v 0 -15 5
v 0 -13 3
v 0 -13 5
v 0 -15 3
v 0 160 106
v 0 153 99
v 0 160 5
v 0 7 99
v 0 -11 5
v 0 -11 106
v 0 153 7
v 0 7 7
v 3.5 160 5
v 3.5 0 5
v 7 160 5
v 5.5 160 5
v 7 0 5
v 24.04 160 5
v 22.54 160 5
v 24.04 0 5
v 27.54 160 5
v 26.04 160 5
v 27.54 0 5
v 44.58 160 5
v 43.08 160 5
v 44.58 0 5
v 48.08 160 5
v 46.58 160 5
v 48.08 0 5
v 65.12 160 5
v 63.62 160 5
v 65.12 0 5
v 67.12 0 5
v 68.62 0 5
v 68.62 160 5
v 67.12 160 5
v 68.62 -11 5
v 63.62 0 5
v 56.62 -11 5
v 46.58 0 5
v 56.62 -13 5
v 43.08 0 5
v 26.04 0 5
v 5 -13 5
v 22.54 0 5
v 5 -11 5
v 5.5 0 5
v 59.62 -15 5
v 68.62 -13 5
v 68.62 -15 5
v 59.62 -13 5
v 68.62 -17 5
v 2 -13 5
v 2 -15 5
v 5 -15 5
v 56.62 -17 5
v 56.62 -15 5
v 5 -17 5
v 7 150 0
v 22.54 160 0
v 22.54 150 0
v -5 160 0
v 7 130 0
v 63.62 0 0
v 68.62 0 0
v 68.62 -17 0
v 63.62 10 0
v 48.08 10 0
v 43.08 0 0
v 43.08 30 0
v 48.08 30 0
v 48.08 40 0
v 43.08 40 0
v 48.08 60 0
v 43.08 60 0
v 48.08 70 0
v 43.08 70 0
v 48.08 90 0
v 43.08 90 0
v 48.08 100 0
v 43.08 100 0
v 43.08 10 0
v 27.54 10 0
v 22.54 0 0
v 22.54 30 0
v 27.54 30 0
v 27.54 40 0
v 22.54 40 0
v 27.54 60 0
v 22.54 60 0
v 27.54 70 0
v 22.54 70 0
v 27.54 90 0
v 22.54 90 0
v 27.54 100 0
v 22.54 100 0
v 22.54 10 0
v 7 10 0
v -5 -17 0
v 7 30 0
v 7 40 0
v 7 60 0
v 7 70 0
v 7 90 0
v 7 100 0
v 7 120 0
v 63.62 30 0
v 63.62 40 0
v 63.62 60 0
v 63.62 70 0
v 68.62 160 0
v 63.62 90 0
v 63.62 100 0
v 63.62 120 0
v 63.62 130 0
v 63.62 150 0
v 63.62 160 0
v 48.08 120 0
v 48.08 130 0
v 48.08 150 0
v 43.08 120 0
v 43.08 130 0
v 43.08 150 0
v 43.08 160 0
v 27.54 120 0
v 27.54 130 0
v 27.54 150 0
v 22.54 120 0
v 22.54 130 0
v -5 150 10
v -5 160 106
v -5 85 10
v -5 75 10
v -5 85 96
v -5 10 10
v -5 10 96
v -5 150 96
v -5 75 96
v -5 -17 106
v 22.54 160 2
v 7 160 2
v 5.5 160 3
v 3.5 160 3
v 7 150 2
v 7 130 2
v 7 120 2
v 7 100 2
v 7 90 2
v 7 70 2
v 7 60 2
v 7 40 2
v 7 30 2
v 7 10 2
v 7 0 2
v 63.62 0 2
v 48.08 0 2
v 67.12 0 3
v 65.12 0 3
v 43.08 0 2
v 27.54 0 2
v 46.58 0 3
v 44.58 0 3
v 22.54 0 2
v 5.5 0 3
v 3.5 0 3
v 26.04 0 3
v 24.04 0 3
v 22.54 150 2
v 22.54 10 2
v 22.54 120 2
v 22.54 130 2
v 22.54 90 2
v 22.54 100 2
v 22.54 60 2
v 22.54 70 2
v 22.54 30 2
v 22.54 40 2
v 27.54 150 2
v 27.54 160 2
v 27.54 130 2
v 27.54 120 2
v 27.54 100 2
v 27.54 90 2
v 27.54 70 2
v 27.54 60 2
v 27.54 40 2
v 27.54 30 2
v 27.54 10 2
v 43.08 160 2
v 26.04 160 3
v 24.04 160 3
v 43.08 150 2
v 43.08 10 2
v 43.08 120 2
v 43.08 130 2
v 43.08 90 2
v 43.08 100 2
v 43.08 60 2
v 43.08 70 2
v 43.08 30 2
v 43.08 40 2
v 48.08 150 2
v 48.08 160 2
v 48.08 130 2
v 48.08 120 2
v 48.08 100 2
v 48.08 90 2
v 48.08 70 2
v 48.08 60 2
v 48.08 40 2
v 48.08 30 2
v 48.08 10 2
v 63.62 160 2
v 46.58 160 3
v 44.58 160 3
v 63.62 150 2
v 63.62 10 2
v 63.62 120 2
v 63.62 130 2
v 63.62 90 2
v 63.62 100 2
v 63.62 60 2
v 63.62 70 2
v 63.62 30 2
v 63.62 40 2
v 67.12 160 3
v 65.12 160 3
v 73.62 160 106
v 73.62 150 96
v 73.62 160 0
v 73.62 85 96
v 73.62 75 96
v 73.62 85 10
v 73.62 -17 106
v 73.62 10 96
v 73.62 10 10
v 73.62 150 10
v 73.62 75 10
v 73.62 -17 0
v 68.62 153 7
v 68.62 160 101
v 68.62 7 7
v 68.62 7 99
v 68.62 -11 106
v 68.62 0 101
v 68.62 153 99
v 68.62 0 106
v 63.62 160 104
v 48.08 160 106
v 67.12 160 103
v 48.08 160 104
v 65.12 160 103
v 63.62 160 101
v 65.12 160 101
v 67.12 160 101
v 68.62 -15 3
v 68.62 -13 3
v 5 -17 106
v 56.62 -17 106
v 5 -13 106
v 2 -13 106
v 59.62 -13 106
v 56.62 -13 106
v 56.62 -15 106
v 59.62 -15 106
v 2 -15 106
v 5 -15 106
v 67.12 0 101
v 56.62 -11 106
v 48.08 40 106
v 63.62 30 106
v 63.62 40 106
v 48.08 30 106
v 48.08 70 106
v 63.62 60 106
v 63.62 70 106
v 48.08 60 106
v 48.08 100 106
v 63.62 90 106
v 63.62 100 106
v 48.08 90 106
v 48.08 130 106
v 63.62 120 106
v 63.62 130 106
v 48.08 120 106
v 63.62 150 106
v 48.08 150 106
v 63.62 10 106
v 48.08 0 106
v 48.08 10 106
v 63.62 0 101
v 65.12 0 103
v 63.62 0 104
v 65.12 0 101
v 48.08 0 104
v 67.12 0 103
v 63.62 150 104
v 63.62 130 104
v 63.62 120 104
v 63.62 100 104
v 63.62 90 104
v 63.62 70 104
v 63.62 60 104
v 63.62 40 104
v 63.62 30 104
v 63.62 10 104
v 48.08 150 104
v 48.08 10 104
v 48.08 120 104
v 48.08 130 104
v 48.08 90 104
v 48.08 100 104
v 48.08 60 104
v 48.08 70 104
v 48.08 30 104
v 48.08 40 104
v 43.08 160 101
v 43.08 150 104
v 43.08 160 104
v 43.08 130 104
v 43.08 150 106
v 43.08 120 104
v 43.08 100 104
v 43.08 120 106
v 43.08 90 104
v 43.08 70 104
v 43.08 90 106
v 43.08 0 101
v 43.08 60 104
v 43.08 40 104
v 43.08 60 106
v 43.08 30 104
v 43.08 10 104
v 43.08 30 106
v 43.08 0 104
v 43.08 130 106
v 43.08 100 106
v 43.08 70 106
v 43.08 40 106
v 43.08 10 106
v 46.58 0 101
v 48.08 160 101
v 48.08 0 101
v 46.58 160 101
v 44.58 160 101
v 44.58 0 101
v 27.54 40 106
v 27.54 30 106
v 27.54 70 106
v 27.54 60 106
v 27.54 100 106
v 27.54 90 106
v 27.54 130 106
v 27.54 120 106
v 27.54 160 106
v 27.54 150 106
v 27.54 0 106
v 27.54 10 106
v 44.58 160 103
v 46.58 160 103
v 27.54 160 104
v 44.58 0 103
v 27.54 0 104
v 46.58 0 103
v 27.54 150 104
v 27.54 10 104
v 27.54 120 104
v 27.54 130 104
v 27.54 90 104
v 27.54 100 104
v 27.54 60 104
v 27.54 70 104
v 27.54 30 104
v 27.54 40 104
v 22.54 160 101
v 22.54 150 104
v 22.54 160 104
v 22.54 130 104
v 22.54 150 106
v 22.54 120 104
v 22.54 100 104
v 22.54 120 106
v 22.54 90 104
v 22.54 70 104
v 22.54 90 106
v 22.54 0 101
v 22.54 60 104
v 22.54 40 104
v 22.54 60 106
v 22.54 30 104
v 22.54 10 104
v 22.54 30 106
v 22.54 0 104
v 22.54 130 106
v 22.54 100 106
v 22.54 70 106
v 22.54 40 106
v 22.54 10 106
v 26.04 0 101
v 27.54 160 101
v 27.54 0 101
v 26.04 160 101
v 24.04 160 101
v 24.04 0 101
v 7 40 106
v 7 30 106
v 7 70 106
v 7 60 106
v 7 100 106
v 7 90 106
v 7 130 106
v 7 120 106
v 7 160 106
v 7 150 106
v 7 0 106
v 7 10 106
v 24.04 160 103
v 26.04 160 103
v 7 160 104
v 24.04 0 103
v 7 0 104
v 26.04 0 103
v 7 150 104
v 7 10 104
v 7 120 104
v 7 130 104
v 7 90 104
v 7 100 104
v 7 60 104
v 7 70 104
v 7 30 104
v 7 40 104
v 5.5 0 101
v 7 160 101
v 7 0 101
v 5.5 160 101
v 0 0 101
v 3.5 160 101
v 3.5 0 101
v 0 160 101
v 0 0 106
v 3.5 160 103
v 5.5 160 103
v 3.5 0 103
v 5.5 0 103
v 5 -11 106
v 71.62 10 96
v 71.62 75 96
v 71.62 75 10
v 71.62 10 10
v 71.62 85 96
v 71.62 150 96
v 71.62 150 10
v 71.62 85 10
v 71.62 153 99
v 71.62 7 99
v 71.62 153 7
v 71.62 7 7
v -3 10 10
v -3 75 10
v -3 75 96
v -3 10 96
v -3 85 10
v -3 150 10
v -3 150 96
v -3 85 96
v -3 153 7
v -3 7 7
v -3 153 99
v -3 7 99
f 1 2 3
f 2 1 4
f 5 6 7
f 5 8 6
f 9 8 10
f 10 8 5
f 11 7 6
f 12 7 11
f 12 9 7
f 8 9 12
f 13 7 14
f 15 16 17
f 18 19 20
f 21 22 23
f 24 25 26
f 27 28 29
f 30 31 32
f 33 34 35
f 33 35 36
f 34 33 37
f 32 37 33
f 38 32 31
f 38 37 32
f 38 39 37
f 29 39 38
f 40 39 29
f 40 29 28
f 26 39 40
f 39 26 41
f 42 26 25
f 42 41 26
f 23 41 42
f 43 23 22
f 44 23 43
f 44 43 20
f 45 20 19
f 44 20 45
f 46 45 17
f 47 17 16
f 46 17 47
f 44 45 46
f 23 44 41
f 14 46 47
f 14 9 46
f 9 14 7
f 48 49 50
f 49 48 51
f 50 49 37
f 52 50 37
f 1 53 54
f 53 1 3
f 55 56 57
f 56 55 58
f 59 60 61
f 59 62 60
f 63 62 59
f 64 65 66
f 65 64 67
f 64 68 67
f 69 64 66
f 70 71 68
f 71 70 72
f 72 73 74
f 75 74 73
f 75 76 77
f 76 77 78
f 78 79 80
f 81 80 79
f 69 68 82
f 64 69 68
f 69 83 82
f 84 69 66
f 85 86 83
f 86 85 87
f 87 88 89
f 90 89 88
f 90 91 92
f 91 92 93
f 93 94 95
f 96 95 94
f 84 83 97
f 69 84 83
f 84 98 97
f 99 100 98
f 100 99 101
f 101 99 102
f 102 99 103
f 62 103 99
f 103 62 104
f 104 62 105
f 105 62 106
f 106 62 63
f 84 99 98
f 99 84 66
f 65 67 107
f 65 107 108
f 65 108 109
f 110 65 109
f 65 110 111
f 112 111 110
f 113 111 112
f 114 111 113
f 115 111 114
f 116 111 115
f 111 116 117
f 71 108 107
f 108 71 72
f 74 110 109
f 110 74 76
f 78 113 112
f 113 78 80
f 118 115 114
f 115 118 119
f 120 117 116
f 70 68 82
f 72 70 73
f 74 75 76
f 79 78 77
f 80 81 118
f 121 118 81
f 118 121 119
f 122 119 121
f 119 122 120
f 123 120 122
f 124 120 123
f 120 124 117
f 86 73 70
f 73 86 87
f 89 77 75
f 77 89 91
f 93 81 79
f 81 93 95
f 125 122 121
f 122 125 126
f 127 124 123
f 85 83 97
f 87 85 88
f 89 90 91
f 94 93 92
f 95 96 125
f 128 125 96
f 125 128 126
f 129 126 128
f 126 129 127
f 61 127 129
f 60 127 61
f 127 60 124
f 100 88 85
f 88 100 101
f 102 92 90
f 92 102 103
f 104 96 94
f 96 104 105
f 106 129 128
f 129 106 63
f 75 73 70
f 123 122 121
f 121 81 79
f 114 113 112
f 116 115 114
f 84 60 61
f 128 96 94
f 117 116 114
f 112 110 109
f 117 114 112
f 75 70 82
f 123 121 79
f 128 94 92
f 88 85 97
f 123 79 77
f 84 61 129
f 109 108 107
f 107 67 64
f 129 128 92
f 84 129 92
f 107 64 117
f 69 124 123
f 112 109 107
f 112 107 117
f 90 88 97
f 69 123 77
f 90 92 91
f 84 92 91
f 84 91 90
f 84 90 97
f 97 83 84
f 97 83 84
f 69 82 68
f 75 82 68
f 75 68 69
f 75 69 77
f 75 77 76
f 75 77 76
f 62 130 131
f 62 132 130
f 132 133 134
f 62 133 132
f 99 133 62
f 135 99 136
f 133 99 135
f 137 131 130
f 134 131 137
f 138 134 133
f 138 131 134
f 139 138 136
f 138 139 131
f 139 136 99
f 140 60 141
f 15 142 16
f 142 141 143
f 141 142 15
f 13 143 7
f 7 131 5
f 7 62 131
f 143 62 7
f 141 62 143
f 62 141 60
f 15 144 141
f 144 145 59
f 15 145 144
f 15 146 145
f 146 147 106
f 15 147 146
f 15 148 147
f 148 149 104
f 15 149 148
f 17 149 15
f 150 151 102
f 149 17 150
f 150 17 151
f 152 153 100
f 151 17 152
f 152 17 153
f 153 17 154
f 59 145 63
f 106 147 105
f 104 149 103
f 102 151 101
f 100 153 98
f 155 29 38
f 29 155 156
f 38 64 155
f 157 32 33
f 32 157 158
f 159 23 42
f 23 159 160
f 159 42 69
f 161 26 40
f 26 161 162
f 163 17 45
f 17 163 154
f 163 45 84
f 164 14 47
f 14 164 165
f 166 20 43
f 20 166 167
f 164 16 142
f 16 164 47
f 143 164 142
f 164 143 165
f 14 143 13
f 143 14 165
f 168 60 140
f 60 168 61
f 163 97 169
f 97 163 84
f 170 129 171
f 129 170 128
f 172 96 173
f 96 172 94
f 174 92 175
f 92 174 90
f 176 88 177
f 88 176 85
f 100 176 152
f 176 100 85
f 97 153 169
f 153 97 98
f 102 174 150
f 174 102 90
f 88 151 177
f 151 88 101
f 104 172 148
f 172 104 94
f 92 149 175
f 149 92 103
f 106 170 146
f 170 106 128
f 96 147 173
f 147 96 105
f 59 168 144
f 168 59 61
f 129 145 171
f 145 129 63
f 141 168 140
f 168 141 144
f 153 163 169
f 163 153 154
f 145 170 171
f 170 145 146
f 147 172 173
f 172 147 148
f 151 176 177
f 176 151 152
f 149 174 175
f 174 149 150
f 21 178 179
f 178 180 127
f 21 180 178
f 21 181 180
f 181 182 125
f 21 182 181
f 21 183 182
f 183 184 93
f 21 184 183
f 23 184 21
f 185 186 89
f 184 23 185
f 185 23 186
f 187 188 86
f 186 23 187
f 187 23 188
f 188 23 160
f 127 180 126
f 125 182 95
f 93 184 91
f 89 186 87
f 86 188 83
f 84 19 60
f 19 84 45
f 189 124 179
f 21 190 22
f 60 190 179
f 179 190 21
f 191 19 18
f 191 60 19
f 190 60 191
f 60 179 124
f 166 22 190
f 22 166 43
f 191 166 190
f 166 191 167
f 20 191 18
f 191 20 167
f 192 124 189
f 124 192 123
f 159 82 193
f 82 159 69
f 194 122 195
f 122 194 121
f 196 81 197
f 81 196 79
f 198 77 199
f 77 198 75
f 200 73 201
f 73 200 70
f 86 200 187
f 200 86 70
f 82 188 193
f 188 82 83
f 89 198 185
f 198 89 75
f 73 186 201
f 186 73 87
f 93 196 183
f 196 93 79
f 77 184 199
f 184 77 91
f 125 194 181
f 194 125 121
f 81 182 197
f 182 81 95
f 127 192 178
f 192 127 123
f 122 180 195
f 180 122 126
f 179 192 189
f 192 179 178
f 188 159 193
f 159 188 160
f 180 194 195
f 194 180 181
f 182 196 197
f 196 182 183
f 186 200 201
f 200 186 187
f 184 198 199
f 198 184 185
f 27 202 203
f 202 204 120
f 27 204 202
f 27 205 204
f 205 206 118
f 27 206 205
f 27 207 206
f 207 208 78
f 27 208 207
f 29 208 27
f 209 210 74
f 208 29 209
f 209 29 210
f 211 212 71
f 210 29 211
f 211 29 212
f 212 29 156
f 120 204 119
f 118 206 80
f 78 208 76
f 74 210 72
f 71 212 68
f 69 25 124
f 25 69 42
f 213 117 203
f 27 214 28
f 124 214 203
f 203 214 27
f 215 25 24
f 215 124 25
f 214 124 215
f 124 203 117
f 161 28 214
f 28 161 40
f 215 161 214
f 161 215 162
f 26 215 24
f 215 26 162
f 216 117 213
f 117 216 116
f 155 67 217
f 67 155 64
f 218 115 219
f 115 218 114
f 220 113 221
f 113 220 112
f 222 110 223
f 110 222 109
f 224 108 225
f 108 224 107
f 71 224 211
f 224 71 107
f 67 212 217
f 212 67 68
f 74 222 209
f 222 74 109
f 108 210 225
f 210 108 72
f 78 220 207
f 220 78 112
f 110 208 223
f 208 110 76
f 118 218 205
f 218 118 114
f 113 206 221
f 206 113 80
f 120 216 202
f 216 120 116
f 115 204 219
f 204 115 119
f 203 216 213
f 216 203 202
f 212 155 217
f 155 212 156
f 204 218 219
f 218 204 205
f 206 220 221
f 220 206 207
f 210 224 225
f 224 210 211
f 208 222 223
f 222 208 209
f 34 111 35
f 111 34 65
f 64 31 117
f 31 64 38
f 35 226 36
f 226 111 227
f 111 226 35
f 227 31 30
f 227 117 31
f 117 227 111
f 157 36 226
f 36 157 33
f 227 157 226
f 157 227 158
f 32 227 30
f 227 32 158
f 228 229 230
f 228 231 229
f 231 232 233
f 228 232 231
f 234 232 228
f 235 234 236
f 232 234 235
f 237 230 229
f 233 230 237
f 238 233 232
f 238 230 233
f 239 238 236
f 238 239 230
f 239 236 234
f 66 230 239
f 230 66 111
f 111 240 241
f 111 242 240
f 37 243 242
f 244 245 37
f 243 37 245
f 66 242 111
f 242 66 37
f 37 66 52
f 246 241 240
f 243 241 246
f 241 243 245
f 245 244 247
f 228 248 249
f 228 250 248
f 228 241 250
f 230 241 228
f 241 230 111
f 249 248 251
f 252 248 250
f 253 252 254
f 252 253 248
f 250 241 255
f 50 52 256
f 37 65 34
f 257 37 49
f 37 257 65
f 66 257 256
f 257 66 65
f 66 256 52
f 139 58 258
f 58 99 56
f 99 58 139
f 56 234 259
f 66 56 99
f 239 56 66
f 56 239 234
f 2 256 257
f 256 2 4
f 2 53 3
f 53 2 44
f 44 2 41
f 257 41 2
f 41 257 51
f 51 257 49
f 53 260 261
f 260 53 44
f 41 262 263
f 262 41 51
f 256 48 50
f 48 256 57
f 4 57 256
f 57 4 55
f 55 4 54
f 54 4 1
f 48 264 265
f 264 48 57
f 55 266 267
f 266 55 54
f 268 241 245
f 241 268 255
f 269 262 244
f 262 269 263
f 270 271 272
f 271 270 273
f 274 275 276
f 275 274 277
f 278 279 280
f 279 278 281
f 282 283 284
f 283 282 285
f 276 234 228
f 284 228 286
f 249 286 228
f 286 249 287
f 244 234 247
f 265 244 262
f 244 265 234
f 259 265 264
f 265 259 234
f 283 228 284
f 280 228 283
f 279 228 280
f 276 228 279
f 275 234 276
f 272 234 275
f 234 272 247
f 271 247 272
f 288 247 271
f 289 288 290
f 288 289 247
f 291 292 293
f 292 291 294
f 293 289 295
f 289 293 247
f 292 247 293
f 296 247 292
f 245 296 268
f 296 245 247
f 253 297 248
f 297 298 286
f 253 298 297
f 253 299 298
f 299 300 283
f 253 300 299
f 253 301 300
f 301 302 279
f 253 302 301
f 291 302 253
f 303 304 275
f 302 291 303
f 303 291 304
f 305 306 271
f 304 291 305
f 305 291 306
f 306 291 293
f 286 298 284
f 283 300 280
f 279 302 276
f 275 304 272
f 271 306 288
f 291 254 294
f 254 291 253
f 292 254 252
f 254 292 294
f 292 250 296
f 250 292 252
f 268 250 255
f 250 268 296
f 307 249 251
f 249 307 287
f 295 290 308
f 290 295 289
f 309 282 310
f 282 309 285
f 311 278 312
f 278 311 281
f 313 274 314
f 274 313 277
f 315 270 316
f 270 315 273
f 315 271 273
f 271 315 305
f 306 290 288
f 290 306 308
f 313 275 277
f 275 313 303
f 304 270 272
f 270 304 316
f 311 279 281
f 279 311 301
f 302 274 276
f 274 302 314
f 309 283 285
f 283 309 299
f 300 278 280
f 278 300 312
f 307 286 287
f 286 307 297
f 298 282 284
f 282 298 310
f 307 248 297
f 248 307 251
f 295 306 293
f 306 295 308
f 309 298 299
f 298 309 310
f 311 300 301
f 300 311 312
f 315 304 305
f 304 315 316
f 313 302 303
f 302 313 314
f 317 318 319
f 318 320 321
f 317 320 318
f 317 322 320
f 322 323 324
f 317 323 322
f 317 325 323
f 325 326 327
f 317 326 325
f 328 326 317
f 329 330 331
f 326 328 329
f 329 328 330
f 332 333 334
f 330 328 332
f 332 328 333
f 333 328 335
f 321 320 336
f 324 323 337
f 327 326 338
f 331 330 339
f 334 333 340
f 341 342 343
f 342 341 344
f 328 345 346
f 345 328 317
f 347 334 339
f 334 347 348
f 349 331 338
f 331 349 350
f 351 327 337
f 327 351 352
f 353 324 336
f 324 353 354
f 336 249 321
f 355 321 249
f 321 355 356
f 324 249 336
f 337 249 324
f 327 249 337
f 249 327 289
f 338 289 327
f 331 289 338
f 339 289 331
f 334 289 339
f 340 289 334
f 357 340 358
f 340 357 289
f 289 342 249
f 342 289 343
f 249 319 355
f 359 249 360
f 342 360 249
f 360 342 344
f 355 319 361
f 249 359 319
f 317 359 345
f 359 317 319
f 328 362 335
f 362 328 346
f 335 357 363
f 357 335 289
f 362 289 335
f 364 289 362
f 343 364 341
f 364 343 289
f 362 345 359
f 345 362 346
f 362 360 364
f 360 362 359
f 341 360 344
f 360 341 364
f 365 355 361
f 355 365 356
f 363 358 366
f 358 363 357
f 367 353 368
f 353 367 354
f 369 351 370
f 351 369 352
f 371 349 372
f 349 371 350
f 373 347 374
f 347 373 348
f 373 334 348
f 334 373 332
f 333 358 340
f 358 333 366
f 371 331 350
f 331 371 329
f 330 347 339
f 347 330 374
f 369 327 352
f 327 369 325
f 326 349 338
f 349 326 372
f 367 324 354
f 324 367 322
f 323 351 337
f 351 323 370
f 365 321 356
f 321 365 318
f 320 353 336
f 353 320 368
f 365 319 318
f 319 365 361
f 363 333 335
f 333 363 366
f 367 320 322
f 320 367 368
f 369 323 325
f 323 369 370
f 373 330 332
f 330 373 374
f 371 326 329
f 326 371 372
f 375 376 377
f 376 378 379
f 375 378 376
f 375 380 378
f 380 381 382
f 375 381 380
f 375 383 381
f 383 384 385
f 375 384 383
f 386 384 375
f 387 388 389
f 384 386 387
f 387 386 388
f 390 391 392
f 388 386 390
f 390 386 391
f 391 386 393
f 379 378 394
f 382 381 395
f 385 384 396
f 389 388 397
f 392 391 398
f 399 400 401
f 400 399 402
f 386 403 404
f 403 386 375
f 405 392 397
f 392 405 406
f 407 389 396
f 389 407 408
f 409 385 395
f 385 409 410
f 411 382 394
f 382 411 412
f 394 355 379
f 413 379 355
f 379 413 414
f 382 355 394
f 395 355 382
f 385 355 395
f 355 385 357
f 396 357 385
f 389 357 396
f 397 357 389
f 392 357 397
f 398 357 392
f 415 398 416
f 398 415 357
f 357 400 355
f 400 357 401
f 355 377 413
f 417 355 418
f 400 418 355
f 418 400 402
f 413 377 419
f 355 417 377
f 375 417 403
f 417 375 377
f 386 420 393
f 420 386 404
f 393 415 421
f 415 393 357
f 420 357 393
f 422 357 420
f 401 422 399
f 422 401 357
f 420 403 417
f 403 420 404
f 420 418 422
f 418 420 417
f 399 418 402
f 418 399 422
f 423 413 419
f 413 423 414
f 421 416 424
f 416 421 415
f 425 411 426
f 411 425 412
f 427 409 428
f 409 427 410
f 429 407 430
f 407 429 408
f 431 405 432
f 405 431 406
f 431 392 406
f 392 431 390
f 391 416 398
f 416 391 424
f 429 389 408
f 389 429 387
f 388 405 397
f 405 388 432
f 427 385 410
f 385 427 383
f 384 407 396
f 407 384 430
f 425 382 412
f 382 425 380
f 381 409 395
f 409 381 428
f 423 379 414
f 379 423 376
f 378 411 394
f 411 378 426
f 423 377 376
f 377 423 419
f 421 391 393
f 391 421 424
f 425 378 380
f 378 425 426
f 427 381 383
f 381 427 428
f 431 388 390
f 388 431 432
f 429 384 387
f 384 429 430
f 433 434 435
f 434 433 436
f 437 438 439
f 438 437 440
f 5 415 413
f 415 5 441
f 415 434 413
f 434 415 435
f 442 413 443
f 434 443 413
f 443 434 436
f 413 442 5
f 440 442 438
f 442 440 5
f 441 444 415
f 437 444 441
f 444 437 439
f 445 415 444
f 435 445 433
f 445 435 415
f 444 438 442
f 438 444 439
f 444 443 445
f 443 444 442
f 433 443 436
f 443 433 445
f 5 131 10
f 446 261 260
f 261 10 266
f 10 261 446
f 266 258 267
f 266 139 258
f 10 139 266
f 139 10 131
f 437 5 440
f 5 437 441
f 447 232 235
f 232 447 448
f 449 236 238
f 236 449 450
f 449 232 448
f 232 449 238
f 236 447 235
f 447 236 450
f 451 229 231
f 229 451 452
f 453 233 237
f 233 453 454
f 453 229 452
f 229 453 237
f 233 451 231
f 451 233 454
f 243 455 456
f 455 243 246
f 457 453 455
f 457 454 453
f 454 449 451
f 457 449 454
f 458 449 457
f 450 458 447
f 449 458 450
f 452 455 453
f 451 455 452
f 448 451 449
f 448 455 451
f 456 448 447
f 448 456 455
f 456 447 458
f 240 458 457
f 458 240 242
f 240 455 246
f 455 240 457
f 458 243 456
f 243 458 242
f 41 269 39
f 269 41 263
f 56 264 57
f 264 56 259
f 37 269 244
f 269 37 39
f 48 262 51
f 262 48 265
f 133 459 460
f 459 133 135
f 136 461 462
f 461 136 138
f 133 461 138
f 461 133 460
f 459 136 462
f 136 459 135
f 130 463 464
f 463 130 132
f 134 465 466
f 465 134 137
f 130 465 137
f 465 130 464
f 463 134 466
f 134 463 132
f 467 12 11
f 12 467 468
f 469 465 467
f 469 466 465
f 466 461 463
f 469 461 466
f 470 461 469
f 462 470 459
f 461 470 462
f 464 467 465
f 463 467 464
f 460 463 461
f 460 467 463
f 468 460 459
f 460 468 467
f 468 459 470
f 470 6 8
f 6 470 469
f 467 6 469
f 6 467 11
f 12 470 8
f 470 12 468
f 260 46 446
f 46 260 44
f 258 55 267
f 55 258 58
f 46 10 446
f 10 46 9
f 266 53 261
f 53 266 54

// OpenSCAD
/*
 * $Id: ecb3-cage.scad 2023 2022-11-01 18:48:36 curt
 * card cage for the retrobrew ecb 3 slot motherboard.
 * the motherboard is held on 3 sides by the cage, and the
 * last side is open to allow somewhat permissive placement of
 * the molex power connector and power switch.  
 * the molex can't really be placed vertically, since it would interfere with the
 * card slide of the bottom card.  
 * placing the molex power connector at a right angle is fine, 
 * the back of motherboard is fine also, after rotating the connector of course.
 *
 * CAUTION: this is my first openscad program, so there may be truly horrific
 * stylistic faux pas in here that a more seasoned openscad programmer would never
 * do.  this is not a showcase of awesome openscad chops, which I do not have.
 */
 
 /*
  * this strange hack is used to express the above designs as individual
  * layers, possibly rotated into the assembled unit.
  * if the string contains 'a', then display everything in assembled orientation
  * if the string contains any of 'lrtb', 
  * display the corresponding left, right, top, bottom side
  * this facility is what I use to test fit the cage together.
  * there may be a better way to do this, but I haven't seen it yet.  
  * as soon as I do, I'll grab it.  
  * there's way too many magic numbers in the translations.
  * this would be possibly made cleaner using some form of a 'min' or 'max'
  * of an object
  */
express = "lrtba";

 /*
  * none of the variables in this file are really tunable
  * they're here to make the code a bit more readable
  * and to create the possiblity of making a future version of this source
  * code work for some other card cage
  */
pitch = 20.54;                  // space between slots
railwidth = 5;                  // size of rail body
gapwidth = pitch - railwidth;   // the space between rails

rails = 3;
railheight = 5;

conlength = 17;
edge = (railwidth + gapwidth) * rails + railwidth + 2;

/*
 * a card guide with a groove on a rail
 */
 module rail(width, height, length, groovewidth, grooveheight) { 
    difference() {
        cube([width, length, height]);
        translate([(width - groovewidth) / 2, -1, height - grooveheight]) 
            cube([groovewidth, length+2, grooveheight + 1]);
    }
}

/*
 * the rails for the 160mm cards
 * there's an extra rail that won't be used for card, but for a cover.
 * this has a little too much slop in the card for my taste, but a 2x2 groove
 * seems to allow easy assembly
 */
module side() {
    /* when building a side, i'll fill the space betwen rails with holes */
    holes = 5;
    holemargin = 10;
    holespace = 10;
    holewidth = 20;
    
    for (i = [0 : rails]) {
        translate ([i * (railwidth + gapwidth), 0, 0]) {
            rail (railwidth, railheight, 160, 2, 2);
            // the last rail, no gap - there's probably a prettier way to do this.
            if (i != rails) {
                translate ([railwidth, 0, 0]) {
                    difference() {
                        cube ([gapwidth, 160, 2]);  // the gap
                        for (h = [0: holes - 1]) {  // has holes
                            translate([0, holemargin + ((holewidth + holespace) * h), -1]) 
                                cube([gapwidth, holewidth, 4]);
                        }
                    }
                }
            }   
        }
    }
}

/*
 * little tabs on the edge to interlock with top and bottom
 * the argument is strictly to make the 'difference' case do a sightlier cutout.
 * it is a hack.
 */
module support(sh = 0) {
    cube([railheight, 5, 5+sh]);
    translate([0, -10, 0]) cube([railheight, 5, 5+sh]);
}

/*
 * decorate each edge with a crenelation. 
 * this is used to dovetail the sides together.
 */
module hooks() {
    translate([0, 10, 0]) support();
    translate([0, 160 - 5, 0]) support();
    translate([0, 82, 0]) support();
}

/*
 * this side is built up with space for pins on the bottom board,
 * plus a support and grove for the motherboard.
 */
module left() {
    translate([-5, 0, 0]) hooks();
    cube([2, 160, railheight]);
    translate([2, 0, 0]) side();
    translate([edge, 0, 0]) hooks();
    
    translate([0, -17, 0]) difference() {
        cube([edge, 17, 5]);
        translate([-1,2,3]) cube([2+edge, 2, 3]);
    }
}

/*
 * this side has no support for the motherboard, as this might block
 * access to the power connector, switch, LED, reset.
 * essentially, I do nothing.  arguably:
 * I should have the slot start higher on the side, giving complete access to the vertical molex
 *      connector
 * the side should support the motherboard, necessitating a very different architecture, 
 * either high rails, a really thick board, an additional surface, etc.
 */
module right() {
    side();
    translate([edge - 2, 0, 0]) 
        cube([2, 160, railheight]);
    
    translate([-5, 0, 0]) hooks();
    translate([edge, 0, 0]) hooks();
}

/*
 * the top and bottom differ in the height of the motherboard holder, 
 * as the boards have component sides using more space than the solder side.
 */
module top() {
    difference () {
        cube([100 + 6, 160, 5]);
        translate([0, 10, -1]) support(2);
        translate([0, 160 - 5, -1]) support(2);
        translate([0, 82, -1]) support(2);
        translate([101, 82, -1]) support(2);
        translate([101, 10, -1]) support(2);
        translate([101, 160 - 5, -1]) support(2);
        translate([10, 10, -1]) cube([86, 65, 7]);
        translate([10, 85, -1]) cube([86, 65, 7]);
        translate([7, 7, 2]) cube([92, 146, 4]);
    }
    translate([0, -17, 0]) {
        cube([106, 17, 5]);
        difference() {
            translate([5, 0, 5]) cube([101, 6, 12]);            
            translate([-1, 2, 14]) cube([108, 2, 4]);           
        }
    }
}

module bottom() {
    
    difference () {
        cube([100 + 6, 160, 5]);
        translate([0, 10, -1]) support(2);
        translate([0, 160 - 5, -1]) support(2);
        translate([0, 82, -1]) support(2);
        translate([101, 82, -1]) support(2);
        translate([101, 10, -1]) support(2);
        translate([101, 160 - 5, -1]) support(2);
        translate([10, 10, -1]) cube([86, 65, 7]);
        translate([10, 85, -1]) cube([86, 65, 7]);
        translate([7, 7, 2]) cube([92, 146, 4]);
    }
    translate([0, -17, 0]) {
        cube([106, 17, 5]);
        difference() {
            translate([0, 0, 5]) cube([101, 6, 5]);            
            translate([-1, 2, 7]) cube([108, 2, 4]);            
        }
    }
}


color("green") {
    if (search("l", express)) {
        left();
    }
}

color ("yellow") {
    if (search("r", express)) {
        if (search("a", express)) {
            translate([edge, 0, 100+6]) 
                rotate([0, 180, 0]) 
                    right();
        } else {
            right();
        }
    }
}

color ("blue") {
    if (search("t", express)) {
        if (search("a", express)) {
            translate([edge+5, 0, 0]) 
                rotate([0, -90, 0]) 
                    top();
        } else {
            top();
        }
    }
}

color("red") {
    if (search("b", express)) {
        if (search("a", express)) {
            translate([-5, 0, 106]) 
                rotate([0, 90, 0]) 
                    bottom();
        } else {
            bottom();
        }
    }
}
